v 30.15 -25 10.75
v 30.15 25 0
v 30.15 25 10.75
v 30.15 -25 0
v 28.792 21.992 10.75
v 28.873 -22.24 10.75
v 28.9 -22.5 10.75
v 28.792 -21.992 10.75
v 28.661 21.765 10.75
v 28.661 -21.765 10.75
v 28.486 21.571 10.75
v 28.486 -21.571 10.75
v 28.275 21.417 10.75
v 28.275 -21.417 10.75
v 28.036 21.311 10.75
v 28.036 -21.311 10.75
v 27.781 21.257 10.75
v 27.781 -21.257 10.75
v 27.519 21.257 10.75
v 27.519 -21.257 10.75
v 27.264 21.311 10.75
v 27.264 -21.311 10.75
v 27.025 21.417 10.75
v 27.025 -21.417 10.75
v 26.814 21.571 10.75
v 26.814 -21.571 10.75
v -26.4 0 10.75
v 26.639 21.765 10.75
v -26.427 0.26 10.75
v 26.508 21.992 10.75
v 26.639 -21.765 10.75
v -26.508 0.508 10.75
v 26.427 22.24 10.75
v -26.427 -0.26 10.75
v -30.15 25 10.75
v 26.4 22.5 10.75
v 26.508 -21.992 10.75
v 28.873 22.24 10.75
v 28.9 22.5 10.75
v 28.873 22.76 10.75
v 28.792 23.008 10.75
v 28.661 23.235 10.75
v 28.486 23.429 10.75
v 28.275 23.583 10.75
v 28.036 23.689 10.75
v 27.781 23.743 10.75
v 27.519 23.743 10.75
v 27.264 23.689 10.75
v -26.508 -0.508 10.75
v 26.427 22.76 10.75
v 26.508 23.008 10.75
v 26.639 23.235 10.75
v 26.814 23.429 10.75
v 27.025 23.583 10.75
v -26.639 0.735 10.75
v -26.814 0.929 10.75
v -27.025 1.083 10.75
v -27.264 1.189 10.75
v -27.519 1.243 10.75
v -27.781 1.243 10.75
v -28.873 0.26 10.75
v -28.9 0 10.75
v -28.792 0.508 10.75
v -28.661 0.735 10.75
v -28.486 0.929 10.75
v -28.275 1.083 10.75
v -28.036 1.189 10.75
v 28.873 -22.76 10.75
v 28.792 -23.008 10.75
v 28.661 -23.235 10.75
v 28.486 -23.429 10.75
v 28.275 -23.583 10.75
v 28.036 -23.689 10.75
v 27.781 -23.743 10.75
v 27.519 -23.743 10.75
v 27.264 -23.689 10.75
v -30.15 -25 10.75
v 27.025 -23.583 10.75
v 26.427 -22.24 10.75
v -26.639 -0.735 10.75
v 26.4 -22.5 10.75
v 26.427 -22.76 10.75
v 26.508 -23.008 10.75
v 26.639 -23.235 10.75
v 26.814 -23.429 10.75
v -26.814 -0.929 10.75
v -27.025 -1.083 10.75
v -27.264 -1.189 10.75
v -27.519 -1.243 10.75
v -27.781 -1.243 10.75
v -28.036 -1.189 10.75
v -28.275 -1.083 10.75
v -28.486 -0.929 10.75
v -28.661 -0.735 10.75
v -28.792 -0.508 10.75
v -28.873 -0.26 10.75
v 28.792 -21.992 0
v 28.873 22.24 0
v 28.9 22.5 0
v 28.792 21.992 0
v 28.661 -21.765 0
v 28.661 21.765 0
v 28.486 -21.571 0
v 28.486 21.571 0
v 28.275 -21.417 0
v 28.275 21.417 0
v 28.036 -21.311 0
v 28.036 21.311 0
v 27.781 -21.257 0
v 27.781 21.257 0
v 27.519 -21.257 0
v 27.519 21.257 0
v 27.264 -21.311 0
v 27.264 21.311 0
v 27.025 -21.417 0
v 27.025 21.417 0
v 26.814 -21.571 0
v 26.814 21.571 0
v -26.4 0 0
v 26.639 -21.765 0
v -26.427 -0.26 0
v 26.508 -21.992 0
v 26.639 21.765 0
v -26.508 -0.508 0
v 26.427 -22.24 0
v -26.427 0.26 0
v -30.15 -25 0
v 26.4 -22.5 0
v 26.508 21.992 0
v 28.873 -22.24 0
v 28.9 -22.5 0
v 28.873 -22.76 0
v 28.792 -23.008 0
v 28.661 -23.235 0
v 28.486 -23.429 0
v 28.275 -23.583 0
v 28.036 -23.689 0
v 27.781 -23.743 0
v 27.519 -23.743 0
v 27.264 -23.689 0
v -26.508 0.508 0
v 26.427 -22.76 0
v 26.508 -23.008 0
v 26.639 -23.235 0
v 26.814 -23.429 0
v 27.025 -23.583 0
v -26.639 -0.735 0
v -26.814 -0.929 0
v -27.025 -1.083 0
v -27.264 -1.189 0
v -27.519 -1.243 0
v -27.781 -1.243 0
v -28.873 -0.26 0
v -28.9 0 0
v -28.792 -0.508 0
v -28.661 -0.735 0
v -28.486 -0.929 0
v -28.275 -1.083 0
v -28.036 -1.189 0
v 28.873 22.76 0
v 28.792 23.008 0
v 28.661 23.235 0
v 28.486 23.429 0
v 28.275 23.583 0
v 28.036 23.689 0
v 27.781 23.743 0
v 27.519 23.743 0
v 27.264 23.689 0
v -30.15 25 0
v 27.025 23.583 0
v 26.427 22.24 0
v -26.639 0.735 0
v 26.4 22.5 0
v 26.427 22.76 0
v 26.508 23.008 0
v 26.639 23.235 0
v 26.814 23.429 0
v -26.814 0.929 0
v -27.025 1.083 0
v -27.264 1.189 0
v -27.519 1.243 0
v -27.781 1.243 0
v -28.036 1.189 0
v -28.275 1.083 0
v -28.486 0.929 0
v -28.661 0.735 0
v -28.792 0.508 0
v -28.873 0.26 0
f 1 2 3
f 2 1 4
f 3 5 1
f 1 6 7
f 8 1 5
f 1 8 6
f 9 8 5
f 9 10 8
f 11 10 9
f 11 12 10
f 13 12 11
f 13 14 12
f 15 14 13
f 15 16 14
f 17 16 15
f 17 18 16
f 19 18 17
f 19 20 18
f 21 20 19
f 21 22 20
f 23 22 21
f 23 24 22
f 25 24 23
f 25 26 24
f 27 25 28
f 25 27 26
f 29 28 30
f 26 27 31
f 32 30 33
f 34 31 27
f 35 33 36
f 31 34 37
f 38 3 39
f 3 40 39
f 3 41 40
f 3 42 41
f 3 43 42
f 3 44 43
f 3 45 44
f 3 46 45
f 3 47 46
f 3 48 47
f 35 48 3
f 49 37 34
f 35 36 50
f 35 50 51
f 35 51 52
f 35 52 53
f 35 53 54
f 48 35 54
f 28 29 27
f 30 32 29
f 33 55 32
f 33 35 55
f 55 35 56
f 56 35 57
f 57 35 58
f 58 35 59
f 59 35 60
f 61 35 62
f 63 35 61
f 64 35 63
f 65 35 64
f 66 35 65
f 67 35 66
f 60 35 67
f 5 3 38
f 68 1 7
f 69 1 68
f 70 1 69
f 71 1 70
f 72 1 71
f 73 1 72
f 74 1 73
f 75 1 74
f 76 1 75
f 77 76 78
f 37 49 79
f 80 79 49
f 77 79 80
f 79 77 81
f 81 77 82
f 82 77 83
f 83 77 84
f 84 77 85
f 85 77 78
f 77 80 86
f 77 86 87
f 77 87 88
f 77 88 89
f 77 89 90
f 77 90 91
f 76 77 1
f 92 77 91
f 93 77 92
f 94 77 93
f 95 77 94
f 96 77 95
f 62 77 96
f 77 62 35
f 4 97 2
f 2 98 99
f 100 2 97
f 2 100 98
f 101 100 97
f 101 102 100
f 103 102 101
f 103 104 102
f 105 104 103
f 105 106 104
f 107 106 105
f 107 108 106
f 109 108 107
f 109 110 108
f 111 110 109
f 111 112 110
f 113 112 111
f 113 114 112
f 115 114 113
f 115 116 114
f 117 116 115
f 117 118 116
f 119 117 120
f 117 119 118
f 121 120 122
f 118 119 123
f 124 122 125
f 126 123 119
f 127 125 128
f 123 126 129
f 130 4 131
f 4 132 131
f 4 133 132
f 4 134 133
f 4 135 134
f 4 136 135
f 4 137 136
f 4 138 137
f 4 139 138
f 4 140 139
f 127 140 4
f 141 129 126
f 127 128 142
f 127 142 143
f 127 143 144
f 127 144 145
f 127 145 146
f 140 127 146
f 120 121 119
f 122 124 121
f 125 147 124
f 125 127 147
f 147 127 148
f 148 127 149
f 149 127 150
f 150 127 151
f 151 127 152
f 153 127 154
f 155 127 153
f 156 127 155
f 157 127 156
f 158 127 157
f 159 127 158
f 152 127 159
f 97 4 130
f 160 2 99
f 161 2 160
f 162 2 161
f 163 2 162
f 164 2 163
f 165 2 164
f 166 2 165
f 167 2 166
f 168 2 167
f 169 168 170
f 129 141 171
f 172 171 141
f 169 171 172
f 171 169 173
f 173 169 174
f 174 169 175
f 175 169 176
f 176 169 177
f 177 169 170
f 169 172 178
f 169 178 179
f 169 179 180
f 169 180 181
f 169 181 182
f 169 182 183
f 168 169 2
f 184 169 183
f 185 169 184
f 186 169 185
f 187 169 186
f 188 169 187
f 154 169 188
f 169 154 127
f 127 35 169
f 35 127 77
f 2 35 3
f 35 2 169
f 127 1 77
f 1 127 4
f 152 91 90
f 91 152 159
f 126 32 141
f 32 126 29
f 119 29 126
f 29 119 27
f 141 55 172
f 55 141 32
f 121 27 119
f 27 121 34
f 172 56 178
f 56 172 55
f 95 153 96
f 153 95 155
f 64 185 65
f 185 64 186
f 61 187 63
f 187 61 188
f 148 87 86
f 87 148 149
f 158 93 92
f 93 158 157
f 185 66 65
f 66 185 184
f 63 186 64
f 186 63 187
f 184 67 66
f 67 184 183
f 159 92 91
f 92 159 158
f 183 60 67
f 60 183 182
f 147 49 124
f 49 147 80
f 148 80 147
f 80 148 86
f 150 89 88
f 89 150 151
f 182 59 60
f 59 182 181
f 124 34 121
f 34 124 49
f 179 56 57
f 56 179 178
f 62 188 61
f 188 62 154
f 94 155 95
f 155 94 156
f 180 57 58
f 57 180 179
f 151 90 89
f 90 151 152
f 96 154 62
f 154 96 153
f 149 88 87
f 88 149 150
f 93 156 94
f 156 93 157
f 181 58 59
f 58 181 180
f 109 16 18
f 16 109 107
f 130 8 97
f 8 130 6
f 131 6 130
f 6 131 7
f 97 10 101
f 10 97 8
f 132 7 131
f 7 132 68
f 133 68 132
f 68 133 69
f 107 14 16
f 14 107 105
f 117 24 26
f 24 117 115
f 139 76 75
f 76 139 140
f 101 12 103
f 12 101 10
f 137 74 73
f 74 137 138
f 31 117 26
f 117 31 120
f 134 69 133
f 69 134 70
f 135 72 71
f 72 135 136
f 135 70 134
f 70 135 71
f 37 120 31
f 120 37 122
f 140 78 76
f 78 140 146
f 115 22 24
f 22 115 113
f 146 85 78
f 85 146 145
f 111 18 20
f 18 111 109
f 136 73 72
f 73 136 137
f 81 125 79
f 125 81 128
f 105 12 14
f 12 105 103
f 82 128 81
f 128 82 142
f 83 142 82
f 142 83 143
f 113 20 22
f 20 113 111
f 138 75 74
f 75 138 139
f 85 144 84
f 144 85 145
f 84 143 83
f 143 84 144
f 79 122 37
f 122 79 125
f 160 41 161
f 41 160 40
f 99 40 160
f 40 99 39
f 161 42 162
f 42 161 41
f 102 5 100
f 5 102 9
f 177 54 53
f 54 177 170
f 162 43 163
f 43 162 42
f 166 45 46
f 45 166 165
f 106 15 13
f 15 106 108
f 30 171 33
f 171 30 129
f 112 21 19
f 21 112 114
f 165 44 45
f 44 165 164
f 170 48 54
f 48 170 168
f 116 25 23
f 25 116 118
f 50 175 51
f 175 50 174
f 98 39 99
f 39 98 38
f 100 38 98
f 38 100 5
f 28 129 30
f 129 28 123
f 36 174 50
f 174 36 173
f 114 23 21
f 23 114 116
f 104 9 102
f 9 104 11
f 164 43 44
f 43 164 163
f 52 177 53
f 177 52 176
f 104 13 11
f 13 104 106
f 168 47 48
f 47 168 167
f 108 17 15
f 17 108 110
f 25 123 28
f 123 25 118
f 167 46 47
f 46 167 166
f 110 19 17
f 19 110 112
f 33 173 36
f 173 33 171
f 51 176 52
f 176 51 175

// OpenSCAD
width = 42.3;
height = 32;
thickness = 10.75;

//frame
//frame(width, height, thickness, 3.05);

//base
frame(width, height, thickness, 2.5);

$fs = 0.1;

module frame(width, height, thickness, holesize)
{
	width = width+18;
	height = height+18;
	halfwidth = width/2;
	halfheight = height/2;
	holex = halfwidth-3+0.5;
	holey = halfheight-3+0.5;

	difference()
	{
		translate([-halfwidth, -halfheight, 0])
			cube([width, height, thickness]);

		translate([-holex, 0, thickness/2])
			cylinder(r=holesize/2, h=thickness+1, center=true);
		translate([holex, -holey, thickness/2])
			cylinder(r=holesize/2, h=thickness+1, center=true);
		translate([holex, holey, thickness/2])
			cylinder(r=holesize/2, h=thickness+1, center=true);
	}
}
